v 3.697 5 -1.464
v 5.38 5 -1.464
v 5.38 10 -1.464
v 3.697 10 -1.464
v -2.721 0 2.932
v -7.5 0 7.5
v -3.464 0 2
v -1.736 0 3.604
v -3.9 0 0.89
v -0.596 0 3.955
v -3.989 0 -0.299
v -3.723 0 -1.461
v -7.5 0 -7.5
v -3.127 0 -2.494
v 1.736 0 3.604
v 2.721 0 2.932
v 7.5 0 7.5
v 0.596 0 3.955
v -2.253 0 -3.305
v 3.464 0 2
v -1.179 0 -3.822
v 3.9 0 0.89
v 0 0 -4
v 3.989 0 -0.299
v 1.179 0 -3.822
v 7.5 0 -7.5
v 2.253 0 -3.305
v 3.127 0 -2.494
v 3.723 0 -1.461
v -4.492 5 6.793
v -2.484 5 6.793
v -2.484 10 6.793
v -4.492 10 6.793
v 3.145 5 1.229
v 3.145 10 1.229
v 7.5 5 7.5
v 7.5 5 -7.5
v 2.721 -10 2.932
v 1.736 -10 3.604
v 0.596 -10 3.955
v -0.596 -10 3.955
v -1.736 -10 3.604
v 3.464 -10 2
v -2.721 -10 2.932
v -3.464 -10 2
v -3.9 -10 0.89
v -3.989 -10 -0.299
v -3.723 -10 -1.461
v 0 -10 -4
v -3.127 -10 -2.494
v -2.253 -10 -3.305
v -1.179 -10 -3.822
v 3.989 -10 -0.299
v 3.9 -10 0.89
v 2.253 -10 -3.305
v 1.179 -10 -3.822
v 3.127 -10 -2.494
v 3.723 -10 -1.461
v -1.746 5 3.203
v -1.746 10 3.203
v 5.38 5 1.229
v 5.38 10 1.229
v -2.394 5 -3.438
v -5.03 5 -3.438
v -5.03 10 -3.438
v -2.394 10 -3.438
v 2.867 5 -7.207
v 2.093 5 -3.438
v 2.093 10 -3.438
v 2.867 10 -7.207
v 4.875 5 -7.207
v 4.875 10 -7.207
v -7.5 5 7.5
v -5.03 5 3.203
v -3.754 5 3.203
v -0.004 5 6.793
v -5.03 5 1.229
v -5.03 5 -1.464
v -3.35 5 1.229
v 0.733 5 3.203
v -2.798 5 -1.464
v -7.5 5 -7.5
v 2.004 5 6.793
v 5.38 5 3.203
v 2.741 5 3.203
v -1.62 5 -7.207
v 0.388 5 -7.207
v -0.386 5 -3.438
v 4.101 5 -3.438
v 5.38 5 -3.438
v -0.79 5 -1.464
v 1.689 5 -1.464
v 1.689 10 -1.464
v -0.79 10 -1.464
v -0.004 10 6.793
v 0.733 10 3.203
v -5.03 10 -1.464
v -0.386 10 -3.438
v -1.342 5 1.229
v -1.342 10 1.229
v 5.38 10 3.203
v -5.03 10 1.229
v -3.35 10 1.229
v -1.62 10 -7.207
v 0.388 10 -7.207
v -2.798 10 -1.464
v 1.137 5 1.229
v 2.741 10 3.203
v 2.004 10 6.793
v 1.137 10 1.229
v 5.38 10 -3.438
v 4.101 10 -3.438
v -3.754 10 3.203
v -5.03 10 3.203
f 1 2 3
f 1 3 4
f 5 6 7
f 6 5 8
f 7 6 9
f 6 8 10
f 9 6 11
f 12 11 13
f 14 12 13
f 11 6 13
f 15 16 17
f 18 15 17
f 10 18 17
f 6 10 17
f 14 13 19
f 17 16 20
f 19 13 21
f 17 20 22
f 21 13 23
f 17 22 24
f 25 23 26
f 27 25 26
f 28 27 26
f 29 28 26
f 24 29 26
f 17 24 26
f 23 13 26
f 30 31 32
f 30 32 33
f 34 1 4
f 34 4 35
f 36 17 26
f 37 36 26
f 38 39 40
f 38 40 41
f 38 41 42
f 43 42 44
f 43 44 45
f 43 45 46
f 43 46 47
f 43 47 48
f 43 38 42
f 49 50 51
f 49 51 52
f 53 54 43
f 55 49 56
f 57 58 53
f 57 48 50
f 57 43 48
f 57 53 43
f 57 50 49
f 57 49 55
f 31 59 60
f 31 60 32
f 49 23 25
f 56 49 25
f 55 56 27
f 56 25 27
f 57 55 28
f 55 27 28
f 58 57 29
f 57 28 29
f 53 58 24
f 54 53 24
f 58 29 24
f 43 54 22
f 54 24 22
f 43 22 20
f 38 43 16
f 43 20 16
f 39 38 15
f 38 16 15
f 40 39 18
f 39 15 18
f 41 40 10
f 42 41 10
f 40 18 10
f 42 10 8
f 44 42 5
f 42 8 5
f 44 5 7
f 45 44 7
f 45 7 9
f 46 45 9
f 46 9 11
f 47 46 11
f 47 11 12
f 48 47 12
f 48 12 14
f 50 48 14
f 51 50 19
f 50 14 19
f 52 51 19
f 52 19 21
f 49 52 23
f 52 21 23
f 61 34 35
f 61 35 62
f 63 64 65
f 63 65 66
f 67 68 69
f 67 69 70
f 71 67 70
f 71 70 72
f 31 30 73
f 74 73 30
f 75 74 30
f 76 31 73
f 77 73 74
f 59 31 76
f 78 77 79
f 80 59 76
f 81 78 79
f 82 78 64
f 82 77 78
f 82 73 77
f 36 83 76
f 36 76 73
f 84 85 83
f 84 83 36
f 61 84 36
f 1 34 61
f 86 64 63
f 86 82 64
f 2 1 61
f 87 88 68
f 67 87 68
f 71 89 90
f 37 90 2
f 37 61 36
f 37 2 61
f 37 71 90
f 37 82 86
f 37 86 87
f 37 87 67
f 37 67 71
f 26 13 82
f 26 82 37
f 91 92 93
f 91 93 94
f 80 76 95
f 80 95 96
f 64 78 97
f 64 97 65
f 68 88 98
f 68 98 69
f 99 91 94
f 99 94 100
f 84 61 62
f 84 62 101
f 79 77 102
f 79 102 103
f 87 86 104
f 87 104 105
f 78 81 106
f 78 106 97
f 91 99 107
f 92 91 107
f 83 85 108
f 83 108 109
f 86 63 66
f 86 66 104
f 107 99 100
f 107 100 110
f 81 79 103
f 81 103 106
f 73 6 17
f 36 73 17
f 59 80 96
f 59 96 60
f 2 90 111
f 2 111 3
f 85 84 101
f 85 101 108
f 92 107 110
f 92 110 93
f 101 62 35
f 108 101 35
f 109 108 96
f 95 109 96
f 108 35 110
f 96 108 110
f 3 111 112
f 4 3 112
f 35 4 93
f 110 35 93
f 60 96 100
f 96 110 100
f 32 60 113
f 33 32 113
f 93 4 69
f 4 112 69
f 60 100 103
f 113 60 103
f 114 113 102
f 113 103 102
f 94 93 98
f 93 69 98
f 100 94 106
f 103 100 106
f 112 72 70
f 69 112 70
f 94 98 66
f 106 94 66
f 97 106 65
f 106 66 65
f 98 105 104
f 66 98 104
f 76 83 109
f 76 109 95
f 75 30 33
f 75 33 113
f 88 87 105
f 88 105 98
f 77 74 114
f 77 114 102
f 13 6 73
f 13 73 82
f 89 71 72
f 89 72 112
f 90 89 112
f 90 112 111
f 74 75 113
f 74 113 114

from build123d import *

# Parameters (mm, degrees)
SKETCH1_W           = 15
SKETCH1_H           = 15
BOSS_EXTRUDE1_DEPTH = 5
BOSS_EXTRUDE2_DEPTH = 5
SKETCH3_R           = 4
BOSS_EXTRUDE3_DEPTH = 10


with BuildPart() as part:
    # Sketch1 → Boss-Extrude1 (new body)
    with BuildSketch(Plane(origin=(0, 0, 0), x_dir=(1, 0, 0), z_dir=(0, 1, 0))):
        Rectangle(SKETCH1_W, SKETCH1_H)
    extrude(amount=BOSS_EXTRUDE1_DEPTH)

    # Sketch2 → Boss-Extrude2 (add)
    with BuildSketch(Plane(origin=(0, 5, 0), x_dir=(1, 0, 0), z_dir=(0, 1, 0))):
        Polygon((-3.754056884, -3.202967132), (-5.03009855, -3.202967132), (-5.03009855, -1.228608158), (-3.35021073, -1.228608158), (-2.797726755, 1.463699535), (-5.03009855, 1.463699535), (-5.03009855, 3.438058509), (-2.393880602, 3.438058509), (-1.61984214, 7.207289278), (0.38817068, 7.207289278), (-0.385867781, 3.438058509), (2.093298886, 3.438058509), (2.867337347, 7.207289278), (4.875350168, 7.207289278), (4.101311706, 3.438058509), (5.38015786, 3.438058509), (5.38015786, 1.463699535), (3.697465552, 1.463699535), (3.144981578, -1.228608158), (5.38015786, -1.228608158), (5.38015786, -3.202967132), (2.741135424, -3.202967132), (2.003555296, -6.792710722), (-0.004457525, -6.792710722), (0.733122604, -3.202967132), (-1.746044063, -3.202967132), (-2.483624191, -6.792710722), (-4.491637012, -6.792710722), align=None)
        Polygon((-0.789713935, 1.463699535), (-1.342197909, -1.228608158), (1.136968757, -1.228608158), (1.689452732, 1.463699535), align=None, mode=Mode.SUBTRACT)
    extrude(amount=BOSS_EXTRUDE2_DEPTH)

    # Sketch3 → Boss-Extrude3 (add)
    with BuildSketch(Plane.XZ):
        with Locations(Location((0, 0, 0), (0, 0, 270))):
            Circle(SKETCH3_R)
    extrude(amount=BOSS_EXTRUDE3_DEPTH)


solid = part.part
